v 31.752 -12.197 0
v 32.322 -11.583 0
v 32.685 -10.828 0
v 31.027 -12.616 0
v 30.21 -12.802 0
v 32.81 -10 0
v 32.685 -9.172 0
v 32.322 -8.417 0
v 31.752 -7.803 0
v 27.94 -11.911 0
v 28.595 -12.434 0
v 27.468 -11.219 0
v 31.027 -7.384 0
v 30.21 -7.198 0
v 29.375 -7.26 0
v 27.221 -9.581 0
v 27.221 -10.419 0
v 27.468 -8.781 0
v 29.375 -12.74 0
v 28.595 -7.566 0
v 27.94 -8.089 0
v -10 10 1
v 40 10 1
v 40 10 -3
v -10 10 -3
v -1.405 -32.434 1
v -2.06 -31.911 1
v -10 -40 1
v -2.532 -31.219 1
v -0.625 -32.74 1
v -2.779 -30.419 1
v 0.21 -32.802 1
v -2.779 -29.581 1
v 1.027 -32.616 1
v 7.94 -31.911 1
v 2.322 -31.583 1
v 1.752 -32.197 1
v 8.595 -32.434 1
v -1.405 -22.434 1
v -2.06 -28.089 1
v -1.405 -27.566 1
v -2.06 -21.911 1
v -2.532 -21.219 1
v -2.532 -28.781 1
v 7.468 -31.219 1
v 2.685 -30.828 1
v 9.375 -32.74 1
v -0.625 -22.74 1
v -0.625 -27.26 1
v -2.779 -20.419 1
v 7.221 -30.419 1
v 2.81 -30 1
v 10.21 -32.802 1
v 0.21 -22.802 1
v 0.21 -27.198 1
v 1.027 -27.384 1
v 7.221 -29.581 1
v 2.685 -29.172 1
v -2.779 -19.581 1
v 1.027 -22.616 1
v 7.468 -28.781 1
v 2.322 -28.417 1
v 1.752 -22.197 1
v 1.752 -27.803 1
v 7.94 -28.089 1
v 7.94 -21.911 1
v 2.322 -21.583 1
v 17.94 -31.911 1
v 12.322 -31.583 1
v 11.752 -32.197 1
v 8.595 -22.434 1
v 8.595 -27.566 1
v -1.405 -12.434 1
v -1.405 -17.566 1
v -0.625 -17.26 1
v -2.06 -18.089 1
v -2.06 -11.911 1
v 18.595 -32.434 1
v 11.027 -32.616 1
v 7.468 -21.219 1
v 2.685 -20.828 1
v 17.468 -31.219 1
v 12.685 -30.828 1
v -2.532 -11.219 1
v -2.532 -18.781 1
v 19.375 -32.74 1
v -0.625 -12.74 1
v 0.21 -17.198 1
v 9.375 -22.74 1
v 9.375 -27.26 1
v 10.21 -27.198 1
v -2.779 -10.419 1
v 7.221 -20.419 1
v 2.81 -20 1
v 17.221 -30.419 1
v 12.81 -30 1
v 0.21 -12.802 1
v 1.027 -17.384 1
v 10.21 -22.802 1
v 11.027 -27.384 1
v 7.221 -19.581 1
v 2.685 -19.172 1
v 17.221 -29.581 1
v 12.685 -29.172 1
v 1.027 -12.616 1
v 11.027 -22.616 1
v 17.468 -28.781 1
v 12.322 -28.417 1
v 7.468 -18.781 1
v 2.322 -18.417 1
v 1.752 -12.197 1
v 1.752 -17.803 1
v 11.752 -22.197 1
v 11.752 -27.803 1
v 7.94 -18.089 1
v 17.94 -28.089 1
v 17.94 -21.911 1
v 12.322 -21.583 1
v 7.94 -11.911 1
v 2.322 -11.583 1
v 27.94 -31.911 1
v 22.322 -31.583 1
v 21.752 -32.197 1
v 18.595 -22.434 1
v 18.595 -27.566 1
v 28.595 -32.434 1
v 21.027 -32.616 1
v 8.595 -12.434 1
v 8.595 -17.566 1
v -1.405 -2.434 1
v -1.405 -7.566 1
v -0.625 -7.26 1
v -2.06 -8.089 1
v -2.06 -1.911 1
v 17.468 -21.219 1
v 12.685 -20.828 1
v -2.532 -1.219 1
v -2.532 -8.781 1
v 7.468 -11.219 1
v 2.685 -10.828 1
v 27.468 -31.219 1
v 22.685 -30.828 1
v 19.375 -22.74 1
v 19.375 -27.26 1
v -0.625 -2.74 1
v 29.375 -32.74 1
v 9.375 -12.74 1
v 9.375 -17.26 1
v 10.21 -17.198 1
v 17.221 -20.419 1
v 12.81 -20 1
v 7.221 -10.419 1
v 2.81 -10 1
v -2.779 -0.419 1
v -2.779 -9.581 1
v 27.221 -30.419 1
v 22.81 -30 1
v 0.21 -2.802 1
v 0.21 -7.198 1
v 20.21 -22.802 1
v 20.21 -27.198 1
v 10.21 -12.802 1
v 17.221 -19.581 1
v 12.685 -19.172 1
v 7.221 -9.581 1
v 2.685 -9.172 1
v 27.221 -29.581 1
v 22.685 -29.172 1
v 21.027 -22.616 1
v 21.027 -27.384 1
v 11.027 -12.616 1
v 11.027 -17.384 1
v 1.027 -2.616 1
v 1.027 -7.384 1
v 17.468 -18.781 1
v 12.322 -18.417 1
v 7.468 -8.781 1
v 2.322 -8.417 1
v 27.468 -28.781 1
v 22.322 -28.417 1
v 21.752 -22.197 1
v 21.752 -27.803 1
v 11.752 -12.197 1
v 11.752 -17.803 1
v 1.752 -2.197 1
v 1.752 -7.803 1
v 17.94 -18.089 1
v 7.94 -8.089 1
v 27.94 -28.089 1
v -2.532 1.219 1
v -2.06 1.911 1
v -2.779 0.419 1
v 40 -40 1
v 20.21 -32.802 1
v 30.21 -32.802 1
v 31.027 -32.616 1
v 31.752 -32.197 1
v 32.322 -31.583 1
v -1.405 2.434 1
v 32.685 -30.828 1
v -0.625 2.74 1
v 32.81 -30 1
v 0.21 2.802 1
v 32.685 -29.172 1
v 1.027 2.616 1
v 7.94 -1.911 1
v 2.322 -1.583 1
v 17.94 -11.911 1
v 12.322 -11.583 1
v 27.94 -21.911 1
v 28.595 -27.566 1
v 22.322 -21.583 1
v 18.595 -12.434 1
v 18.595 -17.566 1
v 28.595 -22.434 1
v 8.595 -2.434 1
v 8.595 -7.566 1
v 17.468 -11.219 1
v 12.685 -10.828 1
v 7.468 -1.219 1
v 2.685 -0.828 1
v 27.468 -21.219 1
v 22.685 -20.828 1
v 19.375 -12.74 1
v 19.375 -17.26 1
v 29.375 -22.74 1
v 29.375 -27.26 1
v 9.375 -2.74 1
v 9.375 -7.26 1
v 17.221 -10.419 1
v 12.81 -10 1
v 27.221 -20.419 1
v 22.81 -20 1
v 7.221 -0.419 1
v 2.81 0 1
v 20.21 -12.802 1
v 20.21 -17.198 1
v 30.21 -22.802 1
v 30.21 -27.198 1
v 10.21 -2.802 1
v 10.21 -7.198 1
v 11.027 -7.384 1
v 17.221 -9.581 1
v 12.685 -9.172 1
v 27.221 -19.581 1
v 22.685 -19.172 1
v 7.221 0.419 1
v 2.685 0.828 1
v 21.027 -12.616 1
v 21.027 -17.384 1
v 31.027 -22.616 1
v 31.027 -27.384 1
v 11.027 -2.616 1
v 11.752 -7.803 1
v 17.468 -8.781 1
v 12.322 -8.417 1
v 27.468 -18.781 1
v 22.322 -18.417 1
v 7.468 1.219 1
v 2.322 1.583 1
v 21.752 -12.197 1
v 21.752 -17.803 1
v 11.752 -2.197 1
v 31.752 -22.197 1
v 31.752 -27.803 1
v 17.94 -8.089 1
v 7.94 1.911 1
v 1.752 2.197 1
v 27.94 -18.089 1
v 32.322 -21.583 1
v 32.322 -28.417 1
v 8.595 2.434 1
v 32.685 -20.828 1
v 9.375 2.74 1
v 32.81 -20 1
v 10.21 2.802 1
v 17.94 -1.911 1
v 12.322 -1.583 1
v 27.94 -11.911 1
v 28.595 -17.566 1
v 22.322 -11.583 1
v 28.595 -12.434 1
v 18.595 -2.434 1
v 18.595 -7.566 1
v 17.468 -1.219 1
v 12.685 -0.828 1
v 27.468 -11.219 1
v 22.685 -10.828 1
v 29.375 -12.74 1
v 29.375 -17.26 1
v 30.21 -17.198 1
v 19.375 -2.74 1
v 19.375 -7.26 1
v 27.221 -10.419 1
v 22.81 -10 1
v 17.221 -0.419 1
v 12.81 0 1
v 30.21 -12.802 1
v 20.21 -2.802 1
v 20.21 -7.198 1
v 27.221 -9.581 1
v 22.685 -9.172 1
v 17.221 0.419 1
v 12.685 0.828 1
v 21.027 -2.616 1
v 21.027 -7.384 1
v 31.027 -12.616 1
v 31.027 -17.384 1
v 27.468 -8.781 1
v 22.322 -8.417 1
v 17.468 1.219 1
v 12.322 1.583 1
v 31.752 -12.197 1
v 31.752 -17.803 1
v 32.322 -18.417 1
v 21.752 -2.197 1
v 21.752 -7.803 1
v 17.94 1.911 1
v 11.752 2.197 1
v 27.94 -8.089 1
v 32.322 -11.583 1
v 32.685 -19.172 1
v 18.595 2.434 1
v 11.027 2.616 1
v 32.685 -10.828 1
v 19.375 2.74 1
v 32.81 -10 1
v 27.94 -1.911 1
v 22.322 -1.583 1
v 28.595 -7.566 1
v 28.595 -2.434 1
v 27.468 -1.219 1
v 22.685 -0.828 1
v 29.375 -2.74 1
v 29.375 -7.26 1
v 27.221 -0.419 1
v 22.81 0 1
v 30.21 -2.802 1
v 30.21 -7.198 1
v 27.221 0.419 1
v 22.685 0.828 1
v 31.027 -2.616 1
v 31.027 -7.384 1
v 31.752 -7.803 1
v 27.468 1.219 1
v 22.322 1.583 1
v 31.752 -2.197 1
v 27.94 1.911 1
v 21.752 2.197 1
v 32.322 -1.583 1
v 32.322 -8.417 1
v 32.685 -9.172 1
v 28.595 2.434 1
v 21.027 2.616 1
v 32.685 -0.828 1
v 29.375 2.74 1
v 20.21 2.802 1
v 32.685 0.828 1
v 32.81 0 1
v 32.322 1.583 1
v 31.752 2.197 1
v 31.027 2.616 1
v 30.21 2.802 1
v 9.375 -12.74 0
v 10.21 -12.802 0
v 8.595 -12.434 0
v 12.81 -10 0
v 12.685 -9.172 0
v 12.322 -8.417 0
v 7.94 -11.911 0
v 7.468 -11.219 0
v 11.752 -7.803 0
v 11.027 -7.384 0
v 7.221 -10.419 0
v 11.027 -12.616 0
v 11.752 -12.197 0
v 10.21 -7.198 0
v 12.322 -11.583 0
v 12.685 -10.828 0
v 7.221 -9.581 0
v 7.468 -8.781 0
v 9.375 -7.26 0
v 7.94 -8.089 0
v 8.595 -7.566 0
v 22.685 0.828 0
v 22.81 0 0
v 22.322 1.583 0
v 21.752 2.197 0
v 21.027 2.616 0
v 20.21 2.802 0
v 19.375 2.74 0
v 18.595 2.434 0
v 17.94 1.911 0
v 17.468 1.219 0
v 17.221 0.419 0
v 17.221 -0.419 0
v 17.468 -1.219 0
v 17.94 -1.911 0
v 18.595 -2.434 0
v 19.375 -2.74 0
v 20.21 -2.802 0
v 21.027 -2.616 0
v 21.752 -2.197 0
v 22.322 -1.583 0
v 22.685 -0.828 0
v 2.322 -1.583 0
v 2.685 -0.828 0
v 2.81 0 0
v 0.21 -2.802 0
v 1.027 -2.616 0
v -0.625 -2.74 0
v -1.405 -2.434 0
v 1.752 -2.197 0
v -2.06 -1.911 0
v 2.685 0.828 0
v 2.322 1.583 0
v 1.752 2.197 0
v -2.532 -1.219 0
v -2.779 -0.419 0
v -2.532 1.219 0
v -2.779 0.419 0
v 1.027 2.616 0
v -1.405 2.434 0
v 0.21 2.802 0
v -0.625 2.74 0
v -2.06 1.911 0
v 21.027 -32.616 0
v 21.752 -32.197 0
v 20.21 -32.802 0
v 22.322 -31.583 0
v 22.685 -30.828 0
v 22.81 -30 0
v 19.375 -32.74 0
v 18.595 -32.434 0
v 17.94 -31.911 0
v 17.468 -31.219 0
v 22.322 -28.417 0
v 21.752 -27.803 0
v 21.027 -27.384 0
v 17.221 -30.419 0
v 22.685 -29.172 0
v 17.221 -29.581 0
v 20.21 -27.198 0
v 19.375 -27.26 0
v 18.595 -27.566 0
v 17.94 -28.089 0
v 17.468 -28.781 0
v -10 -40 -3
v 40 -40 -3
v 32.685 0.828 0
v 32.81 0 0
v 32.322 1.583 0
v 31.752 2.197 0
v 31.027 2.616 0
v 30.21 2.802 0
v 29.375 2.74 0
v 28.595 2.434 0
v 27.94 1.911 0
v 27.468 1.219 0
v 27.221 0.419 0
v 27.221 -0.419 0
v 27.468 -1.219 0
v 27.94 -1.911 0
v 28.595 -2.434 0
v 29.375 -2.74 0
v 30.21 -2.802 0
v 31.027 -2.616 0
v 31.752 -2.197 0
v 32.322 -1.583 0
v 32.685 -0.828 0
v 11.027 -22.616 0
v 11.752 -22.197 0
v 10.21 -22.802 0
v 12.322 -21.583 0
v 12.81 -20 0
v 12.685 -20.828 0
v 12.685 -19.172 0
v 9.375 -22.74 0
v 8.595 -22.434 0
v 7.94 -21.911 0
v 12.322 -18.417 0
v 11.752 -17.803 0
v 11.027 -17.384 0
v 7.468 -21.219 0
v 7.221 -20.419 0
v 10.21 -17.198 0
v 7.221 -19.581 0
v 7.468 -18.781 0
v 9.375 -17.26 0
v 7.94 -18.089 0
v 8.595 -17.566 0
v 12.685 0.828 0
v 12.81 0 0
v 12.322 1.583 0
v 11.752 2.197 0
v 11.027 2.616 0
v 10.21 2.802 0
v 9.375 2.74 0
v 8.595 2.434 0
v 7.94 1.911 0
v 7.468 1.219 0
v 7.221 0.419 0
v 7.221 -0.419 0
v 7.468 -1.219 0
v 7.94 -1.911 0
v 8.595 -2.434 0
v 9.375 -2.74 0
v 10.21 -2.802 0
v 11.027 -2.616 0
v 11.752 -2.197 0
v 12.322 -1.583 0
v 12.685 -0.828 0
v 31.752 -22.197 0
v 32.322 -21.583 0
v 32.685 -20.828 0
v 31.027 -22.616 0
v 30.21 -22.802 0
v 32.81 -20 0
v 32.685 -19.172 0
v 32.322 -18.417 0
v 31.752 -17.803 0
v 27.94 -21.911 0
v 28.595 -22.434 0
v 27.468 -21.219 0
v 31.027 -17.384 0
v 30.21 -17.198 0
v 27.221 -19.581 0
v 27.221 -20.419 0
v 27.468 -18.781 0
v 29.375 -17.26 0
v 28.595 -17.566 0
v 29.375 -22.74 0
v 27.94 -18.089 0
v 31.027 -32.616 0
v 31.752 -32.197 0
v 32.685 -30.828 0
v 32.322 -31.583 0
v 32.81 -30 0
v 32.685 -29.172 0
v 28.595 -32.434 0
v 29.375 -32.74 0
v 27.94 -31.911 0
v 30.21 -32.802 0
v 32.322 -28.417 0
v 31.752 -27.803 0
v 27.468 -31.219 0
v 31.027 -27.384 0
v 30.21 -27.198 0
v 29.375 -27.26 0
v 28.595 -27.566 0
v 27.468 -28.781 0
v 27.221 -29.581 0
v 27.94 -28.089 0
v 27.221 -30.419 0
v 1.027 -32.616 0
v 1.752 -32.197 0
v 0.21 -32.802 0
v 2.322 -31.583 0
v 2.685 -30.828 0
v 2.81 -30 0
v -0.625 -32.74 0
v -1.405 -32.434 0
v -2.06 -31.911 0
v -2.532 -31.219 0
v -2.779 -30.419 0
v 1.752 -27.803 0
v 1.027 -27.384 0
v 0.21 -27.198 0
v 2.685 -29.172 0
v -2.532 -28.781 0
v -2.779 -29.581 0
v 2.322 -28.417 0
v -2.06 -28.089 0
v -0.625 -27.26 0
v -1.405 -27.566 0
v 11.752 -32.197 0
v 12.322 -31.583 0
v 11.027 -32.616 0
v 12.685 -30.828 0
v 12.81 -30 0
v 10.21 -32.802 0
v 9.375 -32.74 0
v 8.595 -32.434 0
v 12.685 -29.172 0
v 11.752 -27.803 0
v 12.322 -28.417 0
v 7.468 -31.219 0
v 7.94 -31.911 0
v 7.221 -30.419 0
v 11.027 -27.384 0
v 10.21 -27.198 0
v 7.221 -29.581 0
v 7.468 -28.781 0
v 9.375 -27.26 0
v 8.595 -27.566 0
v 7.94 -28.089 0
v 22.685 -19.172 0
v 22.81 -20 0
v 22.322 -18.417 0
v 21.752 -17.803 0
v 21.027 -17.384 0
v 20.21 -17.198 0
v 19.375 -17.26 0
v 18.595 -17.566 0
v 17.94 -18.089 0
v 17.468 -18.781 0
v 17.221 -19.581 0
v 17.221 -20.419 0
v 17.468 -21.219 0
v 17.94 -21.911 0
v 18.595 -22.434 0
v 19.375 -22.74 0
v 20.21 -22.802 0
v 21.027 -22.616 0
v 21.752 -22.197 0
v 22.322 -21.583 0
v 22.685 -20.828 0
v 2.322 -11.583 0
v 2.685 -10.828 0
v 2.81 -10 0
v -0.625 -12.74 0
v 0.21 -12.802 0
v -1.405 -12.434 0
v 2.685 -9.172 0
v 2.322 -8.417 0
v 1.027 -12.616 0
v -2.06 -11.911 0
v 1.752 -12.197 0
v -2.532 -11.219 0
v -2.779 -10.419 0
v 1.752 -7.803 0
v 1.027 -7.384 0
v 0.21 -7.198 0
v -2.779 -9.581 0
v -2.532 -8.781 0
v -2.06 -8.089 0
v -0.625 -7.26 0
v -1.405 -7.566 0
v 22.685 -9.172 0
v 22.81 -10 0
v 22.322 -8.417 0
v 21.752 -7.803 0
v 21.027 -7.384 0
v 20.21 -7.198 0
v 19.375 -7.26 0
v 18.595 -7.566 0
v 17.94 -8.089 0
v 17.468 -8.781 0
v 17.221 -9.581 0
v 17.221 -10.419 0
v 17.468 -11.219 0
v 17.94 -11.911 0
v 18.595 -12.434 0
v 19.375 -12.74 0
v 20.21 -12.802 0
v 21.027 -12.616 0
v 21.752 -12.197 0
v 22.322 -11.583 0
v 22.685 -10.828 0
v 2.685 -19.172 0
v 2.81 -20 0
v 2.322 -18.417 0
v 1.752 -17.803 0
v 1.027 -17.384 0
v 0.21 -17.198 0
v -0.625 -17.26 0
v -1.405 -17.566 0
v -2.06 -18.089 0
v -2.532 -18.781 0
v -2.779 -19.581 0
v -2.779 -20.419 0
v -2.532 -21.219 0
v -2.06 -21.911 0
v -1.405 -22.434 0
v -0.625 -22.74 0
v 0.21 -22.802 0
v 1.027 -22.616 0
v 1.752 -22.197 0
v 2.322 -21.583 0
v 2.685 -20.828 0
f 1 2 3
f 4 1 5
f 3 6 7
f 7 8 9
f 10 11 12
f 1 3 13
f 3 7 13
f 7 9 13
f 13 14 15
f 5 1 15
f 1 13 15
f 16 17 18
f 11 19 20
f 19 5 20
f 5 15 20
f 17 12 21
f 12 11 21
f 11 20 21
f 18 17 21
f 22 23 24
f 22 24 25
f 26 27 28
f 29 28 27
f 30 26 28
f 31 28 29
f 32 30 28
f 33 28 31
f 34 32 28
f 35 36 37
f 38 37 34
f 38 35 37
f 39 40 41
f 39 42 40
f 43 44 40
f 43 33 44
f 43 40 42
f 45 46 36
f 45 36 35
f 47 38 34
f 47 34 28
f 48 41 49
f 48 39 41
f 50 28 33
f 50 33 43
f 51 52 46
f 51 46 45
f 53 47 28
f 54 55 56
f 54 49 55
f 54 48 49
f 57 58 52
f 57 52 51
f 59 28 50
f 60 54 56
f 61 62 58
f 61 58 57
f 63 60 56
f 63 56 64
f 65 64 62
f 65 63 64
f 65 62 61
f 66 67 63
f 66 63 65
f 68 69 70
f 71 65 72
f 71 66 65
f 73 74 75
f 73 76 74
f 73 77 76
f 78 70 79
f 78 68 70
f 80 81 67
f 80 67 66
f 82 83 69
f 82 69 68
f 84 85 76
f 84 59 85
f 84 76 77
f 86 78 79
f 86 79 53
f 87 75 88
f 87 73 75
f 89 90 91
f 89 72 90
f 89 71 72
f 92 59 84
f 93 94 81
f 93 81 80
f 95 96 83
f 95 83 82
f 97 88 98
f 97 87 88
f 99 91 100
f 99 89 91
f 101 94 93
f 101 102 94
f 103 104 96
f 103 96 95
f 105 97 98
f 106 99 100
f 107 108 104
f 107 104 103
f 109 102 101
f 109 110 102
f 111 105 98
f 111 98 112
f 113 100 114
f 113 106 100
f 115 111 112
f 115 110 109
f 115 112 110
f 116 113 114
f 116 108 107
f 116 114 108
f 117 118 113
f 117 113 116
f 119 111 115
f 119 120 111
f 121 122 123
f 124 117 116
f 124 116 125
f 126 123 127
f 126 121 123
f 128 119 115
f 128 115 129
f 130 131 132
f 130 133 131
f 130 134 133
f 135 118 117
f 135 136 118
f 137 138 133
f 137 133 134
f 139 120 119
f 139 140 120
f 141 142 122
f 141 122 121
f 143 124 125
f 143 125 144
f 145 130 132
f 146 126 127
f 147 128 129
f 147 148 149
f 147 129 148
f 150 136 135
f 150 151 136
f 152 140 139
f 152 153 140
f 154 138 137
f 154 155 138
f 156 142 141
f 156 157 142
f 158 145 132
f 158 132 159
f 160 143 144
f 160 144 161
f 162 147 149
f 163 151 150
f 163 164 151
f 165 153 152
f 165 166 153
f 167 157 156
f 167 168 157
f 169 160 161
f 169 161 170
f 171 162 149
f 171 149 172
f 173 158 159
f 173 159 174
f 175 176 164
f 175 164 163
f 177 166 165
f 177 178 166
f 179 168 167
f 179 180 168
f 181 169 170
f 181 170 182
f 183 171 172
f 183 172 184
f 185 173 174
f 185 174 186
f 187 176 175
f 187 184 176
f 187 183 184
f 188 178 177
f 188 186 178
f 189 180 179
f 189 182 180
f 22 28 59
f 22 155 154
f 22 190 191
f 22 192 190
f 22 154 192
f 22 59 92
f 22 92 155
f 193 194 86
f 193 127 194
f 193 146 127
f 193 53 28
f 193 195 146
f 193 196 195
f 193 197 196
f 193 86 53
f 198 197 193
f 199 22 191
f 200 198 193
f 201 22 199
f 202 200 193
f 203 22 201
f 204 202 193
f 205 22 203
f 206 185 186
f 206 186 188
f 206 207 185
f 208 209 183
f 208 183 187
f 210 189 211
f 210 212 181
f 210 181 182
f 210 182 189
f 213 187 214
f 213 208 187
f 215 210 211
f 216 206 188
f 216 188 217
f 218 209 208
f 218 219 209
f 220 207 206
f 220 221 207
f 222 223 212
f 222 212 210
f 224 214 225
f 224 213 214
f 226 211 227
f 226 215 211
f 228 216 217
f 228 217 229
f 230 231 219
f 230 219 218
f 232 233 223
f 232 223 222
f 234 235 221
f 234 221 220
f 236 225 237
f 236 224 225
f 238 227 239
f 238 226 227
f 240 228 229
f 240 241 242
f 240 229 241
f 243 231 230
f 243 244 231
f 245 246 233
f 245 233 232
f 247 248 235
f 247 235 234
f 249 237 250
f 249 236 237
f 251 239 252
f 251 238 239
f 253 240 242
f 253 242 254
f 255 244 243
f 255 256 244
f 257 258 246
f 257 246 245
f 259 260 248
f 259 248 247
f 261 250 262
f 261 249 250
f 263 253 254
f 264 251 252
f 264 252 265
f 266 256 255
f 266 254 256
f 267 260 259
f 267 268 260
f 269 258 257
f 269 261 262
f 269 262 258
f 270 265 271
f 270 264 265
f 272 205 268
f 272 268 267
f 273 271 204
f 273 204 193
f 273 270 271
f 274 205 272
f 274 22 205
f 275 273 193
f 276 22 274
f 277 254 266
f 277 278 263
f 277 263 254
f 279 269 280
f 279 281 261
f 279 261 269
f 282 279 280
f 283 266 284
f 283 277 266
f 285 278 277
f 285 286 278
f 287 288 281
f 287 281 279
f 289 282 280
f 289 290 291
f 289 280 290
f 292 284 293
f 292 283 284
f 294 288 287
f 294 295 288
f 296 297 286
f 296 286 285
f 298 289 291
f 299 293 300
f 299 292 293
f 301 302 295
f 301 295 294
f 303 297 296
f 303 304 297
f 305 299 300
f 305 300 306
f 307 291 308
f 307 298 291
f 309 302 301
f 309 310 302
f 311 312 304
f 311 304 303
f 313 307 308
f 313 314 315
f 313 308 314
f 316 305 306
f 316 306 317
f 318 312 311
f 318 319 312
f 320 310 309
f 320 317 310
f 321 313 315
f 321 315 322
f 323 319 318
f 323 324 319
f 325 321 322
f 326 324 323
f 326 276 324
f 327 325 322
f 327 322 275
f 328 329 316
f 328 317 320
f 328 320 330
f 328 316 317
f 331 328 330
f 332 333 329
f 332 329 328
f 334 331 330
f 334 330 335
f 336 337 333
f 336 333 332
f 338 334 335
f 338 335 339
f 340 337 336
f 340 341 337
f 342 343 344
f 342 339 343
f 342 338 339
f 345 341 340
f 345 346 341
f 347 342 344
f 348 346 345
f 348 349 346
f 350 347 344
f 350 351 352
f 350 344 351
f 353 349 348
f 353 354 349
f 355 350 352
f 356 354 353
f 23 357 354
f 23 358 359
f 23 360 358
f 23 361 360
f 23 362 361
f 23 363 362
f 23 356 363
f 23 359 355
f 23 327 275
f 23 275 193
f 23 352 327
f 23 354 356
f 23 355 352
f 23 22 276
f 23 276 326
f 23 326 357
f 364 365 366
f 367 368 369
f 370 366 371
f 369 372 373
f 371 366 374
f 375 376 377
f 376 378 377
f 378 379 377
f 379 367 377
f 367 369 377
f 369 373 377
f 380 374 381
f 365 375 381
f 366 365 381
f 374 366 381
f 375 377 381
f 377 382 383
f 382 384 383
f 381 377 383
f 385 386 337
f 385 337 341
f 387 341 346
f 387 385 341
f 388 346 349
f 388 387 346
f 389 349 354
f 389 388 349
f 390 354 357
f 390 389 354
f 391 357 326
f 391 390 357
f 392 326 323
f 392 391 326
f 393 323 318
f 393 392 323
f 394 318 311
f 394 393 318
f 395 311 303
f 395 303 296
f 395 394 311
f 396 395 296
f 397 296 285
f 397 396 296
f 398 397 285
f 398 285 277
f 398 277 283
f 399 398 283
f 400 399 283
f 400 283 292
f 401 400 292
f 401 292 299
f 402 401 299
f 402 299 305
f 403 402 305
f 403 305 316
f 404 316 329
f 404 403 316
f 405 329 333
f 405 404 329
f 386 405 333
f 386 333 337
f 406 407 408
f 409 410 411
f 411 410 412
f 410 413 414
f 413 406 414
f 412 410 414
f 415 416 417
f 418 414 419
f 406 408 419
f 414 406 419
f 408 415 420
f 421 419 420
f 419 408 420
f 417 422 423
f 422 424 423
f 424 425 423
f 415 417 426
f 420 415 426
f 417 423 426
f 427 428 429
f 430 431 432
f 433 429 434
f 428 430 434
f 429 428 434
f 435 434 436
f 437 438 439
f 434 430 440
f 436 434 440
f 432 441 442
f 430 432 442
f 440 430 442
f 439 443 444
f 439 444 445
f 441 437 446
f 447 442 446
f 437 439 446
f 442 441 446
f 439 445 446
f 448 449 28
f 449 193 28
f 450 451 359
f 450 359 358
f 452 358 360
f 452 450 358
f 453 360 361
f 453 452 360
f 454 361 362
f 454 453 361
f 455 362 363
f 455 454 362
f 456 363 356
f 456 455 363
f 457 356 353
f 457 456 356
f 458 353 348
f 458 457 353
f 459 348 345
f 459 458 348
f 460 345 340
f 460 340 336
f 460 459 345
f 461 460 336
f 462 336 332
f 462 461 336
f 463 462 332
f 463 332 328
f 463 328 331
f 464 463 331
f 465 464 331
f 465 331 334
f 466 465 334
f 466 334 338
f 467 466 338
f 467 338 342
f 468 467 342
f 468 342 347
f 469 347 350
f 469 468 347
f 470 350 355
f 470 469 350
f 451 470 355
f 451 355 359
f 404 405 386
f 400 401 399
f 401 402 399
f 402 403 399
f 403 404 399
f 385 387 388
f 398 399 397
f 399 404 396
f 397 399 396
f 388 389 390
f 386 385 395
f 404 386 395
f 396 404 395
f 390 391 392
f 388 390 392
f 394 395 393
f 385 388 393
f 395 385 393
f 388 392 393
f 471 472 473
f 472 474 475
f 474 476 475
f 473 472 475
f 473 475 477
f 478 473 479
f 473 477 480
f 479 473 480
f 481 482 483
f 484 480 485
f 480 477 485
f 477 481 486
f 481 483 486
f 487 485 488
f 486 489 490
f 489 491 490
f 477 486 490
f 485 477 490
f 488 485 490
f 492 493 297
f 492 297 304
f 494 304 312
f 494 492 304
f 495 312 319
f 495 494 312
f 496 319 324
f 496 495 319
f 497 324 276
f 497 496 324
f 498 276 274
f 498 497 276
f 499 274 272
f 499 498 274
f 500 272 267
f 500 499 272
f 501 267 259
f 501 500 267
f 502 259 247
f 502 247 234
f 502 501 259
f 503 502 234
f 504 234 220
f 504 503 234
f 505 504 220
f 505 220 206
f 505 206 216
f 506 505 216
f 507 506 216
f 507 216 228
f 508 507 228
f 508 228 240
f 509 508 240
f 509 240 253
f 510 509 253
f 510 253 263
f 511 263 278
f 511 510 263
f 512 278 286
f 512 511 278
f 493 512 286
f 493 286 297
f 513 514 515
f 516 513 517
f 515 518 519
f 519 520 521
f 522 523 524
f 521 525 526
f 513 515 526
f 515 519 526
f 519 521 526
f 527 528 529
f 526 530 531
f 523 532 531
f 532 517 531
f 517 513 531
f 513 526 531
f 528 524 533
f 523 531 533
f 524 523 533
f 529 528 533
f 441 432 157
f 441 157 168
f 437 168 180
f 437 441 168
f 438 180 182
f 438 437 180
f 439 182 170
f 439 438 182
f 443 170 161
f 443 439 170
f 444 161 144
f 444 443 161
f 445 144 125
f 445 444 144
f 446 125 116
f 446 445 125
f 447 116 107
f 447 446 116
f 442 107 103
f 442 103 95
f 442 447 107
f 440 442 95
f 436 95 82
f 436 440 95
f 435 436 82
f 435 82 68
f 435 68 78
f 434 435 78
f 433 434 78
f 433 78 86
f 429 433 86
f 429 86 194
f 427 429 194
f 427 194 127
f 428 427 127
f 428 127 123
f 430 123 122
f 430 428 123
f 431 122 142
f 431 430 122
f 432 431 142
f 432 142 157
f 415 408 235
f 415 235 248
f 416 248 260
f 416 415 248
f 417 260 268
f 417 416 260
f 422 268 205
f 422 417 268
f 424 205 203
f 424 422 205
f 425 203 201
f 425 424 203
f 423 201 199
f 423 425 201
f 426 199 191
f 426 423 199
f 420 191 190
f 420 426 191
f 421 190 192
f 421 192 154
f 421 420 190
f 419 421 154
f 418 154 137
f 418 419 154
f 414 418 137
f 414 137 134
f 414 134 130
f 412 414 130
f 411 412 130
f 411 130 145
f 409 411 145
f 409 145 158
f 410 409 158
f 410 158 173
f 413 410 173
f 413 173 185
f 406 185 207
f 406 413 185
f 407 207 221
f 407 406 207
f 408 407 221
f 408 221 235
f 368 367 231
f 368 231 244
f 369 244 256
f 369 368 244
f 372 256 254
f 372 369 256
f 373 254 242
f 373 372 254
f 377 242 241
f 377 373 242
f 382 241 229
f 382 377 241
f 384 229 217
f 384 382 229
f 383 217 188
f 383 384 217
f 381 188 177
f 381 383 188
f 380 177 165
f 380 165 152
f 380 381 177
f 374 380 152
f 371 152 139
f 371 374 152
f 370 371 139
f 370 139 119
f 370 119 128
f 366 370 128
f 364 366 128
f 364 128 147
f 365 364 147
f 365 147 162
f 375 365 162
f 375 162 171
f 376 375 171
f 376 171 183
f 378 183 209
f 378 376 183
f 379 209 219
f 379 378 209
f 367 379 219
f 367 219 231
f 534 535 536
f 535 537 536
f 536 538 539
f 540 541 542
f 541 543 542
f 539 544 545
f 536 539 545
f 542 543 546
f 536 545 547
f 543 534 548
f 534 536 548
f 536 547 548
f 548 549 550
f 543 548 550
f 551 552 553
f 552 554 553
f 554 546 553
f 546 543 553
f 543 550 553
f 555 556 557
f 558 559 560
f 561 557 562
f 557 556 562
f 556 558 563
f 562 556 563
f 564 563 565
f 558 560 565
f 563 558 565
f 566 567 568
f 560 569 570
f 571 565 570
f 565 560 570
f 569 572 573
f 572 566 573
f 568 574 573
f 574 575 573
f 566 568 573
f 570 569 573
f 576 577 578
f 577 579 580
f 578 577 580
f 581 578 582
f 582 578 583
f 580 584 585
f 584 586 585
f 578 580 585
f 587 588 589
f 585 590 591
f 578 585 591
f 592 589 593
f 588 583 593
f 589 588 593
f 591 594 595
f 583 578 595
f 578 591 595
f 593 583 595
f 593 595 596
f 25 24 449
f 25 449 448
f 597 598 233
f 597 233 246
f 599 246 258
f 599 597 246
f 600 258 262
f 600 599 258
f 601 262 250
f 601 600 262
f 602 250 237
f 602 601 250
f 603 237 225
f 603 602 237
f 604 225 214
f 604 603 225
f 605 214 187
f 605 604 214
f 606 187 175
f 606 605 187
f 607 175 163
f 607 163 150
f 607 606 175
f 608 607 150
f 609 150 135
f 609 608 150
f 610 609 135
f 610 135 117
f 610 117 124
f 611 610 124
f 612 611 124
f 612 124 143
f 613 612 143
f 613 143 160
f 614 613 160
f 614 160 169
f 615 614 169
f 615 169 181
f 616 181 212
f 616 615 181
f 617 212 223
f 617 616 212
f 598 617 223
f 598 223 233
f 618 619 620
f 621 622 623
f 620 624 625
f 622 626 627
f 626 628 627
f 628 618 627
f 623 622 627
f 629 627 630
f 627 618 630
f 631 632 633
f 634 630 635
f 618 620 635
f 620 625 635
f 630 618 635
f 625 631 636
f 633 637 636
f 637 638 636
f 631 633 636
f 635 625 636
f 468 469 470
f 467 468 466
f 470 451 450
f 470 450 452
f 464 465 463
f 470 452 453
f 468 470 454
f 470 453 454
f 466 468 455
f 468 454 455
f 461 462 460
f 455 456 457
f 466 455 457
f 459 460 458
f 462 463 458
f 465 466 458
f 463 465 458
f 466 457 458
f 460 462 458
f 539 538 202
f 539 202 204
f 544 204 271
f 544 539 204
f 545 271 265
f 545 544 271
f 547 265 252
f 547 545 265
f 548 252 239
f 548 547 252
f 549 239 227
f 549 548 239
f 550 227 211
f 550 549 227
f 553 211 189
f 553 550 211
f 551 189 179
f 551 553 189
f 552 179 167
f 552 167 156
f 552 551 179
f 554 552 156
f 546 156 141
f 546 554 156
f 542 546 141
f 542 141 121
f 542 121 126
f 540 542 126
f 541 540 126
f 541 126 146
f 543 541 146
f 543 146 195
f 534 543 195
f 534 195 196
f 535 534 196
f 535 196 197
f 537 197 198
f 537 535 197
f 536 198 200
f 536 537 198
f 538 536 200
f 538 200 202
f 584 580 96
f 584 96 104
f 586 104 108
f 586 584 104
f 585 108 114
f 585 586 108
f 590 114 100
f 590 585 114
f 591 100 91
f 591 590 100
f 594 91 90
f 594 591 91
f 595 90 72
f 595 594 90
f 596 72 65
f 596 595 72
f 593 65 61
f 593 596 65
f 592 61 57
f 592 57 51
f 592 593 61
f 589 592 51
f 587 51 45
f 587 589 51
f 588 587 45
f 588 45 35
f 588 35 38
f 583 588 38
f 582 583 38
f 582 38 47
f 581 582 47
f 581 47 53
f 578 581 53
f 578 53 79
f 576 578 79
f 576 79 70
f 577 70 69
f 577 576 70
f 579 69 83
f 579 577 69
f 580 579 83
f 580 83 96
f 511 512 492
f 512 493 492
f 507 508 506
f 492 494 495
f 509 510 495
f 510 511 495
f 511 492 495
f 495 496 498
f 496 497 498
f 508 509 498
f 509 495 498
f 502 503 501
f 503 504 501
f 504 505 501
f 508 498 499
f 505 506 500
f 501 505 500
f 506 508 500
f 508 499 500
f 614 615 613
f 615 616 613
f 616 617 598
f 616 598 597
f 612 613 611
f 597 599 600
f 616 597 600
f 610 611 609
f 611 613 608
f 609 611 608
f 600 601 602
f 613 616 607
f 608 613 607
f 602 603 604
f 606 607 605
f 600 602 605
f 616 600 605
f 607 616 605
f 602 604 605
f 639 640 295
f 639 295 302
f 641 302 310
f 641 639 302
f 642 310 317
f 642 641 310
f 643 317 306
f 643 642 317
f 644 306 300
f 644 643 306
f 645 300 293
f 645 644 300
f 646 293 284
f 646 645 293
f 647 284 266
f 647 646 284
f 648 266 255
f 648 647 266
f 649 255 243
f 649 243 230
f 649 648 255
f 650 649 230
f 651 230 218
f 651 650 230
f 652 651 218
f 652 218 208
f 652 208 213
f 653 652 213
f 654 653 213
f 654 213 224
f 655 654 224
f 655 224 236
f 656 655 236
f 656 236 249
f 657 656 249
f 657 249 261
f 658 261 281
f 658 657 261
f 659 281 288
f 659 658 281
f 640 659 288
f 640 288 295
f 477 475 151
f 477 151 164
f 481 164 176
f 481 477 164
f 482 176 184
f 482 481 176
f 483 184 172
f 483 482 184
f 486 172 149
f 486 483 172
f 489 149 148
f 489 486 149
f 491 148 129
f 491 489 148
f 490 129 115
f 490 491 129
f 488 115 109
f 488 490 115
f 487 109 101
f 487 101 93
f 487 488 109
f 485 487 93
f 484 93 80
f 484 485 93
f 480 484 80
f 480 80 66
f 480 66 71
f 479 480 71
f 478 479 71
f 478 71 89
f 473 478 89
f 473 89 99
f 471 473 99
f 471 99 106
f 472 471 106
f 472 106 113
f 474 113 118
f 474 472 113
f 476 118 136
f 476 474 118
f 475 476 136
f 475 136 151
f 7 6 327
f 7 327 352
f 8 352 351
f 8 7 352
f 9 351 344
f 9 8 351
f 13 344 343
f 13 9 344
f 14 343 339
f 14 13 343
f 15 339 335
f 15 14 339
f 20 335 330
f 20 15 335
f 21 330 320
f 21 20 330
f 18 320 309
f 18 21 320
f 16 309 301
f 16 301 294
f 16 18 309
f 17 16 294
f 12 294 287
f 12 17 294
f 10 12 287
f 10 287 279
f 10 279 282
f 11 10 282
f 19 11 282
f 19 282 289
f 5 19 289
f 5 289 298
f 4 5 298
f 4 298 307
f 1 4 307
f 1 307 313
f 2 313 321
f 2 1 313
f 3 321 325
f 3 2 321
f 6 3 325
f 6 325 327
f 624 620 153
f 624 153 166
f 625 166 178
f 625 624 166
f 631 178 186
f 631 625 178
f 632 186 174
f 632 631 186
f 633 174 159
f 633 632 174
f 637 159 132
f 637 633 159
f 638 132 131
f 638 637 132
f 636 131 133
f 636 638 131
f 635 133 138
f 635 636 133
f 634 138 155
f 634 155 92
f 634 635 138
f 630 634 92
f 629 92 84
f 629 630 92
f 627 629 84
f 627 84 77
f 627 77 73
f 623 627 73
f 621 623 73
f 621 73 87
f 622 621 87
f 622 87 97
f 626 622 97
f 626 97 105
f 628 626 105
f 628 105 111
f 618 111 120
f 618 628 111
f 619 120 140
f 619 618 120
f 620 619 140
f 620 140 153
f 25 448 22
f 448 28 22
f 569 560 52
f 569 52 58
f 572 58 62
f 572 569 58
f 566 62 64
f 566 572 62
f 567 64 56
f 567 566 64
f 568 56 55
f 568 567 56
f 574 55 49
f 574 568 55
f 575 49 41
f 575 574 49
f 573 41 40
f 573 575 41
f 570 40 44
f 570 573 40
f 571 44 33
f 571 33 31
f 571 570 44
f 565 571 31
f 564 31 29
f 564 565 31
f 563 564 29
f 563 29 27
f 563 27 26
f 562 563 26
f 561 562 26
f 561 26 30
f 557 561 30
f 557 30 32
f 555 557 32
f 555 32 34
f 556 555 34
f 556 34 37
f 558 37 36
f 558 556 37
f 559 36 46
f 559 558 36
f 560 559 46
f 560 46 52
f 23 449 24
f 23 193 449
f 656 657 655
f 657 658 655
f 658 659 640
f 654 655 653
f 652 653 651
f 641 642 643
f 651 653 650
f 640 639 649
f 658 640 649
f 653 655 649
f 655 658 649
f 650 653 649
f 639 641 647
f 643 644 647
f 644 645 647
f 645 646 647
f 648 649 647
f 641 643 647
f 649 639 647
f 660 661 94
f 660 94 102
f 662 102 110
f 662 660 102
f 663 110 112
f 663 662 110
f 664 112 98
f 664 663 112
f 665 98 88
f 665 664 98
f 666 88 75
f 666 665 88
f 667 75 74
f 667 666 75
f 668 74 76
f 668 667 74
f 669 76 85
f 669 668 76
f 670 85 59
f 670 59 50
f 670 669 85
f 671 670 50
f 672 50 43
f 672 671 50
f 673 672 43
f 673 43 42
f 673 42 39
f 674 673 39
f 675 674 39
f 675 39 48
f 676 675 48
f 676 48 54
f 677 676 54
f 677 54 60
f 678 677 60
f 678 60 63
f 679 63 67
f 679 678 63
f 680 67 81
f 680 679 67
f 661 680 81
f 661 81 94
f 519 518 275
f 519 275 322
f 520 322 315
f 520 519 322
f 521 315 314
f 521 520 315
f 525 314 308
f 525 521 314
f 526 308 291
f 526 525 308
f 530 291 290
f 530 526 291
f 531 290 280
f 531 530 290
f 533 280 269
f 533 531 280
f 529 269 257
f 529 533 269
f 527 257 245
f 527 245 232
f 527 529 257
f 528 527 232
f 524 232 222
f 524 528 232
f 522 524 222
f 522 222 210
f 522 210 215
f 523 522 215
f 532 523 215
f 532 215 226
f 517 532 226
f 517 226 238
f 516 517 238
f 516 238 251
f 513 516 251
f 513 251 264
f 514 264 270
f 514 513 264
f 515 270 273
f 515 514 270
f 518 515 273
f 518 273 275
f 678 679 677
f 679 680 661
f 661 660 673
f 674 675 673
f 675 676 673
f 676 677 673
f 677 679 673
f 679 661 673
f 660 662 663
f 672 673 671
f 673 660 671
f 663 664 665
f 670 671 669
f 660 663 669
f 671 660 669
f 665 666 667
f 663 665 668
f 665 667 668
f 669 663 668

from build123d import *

# Parameters (mm, degrees)
SKETCH1_W           = 50
SKETCH1_H           = 50
SKETCH1_R           = 2.81
BOSS_EXTRUDE1_DEPTH = 1
SKETCH2_W           = 50
SKETCH2_H           = 50
BOSS_EXTRUDE2_DEPTH = 3


with BuildPart() as part:
    # Sketch1 → Boss-Extrude1 (new body)
    with BuildSketch(Plane.XY):
        with Locations((15, -15)):
            Rectangle(SKETCH1_W, SKETCH1_H)
        Circle(SKETCH1_R, mode=Mode.SUBTRACT)
        with Locations((10, 0)):
            Circle(SKETCH1_R, mode=Mode.SUBTRACT)
        with Locations((20, 0)):
            Circle(SKETCH1_R, mode=Mode.SUBTRACT)
        with Locations((30, 0)):
            Circle(SKETCH1_R, mode=Mode.SUBTRACT)
        with Locations((10, -10)):
            Circle(SKETCH1_R, mode=Mode.SUBTRACT)
        with Locations((20, -10)):
            Circle(SKETCH1_R, mode=Mode.SUBTRACT)
        with Locations((30, -10)):
            Circle(SKETCH1_R, mode=Mode.SUBTRACT)
        with Locations((10, -20)):
            Circle(SKETCH1_R, mode=Mode.SUBTRACT)
        with Locations((20, -20)):
            Circle(SKETCH1_R, mode=Mode.SUBTRACT)
        with Locations((30, -20)):
            Circle(SKETCH1_R, mode=Mode.SUBTRACT)
        with Locations((10, -30)):
            Circle(SKETCH1_R, mode=Mode.SUBTRACT)
        with Locations((20, -30)):
            Circle(SKETCH1_R, mode=Mode.SUBTRACT)
        with Locations((30, -30)):
            Circle(SKETCH1_R, mode=Mode.SUBTRACT)
        with Locations((0, -10)):
            Circle(SKETCH1_R, mode=Mode.SUBTRACT)
        with Locations((0, -20)):
            Circle(SKETCH1_R, mode=Mode.SUBTRACT)
        with Locations((0, -30)):
            Circle(SKETCH1_R, mode=Mode.SUBTRACT)
    extrude(amount=BOSS_EXTRUDE1_DEPTH)

    # Sketch2 → Boss-Extrude2 (add)
    with BuildSketch(Plane(origin=(0, 0, 0), x_dir=(-1, 0, 0), z_dir=(0, 0, -1))):
        with Locations((-15, -15)):
            Rectangle(SKETCH2_W, SKETCH2_H)
    extrude(amount=BOSS_EXTRUDE2_DEPTH)


solid = part.part
